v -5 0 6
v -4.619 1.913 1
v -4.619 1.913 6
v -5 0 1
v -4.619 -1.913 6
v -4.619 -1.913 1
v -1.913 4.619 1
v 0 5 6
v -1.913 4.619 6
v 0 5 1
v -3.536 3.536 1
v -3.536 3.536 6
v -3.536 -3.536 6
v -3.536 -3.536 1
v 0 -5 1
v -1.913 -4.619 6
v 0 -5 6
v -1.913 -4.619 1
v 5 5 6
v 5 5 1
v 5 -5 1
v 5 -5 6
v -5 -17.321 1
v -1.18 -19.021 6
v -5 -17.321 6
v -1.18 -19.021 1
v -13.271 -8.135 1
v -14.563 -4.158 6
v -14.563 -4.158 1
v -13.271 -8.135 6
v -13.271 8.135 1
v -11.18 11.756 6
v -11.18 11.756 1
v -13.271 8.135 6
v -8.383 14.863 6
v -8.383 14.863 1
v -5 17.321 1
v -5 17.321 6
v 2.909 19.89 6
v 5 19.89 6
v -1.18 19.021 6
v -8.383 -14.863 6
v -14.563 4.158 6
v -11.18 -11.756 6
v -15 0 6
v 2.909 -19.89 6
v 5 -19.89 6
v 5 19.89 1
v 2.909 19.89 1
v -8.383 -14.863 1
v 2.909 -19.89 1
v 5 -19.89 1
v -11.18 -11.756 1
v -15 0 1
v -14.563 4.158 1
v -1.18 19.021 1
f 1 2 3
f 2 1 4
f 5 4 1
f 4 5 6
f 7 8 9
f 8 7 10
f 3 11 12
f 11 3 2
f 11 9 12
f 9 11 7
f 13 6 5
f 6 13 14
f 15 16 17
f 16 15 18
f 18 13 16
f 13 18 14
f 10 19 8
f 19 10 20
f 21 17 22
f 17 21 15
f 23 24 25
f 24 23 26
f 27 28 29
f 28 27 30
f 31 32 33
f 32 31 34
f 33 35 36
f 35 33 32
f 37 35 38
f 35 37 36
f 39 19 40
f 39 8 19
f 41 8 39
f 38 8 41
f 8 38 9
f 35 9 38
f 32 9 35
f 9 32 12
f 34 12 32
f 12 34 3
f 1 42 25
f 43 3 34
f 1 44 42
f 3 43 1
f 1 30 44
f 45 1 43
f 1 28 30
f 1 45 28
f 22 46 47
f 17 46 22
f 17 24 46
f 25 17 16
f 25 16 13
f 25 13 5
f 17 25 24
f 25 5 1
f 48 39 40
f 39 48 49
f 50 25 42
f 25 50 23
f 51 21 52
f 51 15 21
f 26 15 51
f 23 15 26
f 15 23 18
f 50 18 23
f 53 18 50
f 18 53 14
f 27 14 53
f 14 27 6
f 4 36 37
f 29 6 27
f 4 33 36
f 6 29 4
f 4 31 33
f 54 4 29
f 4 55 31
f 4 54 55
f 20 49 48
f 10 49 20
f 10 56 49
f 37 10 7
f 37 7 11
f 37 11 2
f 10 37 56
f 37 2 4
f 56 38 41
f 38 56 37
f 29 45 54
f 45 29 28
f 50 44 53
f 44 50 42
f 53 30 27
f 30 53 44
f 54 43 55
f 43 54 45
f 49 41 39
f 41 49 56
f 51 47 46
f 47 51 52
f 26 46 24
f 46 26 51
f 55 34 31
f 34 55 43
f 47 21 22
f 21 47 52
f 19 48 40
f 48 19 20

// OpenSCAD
difference(){

difference(){
    translate([5,0,1])
    cylinder(h=5, r1=20, r2=20);    
    union(){
        cylinder(h=10, r1=5, r2=5);
        translate([0,-5,0])
        cube(10);
}
}
translate([5,-20,0])
cube(40);
}
